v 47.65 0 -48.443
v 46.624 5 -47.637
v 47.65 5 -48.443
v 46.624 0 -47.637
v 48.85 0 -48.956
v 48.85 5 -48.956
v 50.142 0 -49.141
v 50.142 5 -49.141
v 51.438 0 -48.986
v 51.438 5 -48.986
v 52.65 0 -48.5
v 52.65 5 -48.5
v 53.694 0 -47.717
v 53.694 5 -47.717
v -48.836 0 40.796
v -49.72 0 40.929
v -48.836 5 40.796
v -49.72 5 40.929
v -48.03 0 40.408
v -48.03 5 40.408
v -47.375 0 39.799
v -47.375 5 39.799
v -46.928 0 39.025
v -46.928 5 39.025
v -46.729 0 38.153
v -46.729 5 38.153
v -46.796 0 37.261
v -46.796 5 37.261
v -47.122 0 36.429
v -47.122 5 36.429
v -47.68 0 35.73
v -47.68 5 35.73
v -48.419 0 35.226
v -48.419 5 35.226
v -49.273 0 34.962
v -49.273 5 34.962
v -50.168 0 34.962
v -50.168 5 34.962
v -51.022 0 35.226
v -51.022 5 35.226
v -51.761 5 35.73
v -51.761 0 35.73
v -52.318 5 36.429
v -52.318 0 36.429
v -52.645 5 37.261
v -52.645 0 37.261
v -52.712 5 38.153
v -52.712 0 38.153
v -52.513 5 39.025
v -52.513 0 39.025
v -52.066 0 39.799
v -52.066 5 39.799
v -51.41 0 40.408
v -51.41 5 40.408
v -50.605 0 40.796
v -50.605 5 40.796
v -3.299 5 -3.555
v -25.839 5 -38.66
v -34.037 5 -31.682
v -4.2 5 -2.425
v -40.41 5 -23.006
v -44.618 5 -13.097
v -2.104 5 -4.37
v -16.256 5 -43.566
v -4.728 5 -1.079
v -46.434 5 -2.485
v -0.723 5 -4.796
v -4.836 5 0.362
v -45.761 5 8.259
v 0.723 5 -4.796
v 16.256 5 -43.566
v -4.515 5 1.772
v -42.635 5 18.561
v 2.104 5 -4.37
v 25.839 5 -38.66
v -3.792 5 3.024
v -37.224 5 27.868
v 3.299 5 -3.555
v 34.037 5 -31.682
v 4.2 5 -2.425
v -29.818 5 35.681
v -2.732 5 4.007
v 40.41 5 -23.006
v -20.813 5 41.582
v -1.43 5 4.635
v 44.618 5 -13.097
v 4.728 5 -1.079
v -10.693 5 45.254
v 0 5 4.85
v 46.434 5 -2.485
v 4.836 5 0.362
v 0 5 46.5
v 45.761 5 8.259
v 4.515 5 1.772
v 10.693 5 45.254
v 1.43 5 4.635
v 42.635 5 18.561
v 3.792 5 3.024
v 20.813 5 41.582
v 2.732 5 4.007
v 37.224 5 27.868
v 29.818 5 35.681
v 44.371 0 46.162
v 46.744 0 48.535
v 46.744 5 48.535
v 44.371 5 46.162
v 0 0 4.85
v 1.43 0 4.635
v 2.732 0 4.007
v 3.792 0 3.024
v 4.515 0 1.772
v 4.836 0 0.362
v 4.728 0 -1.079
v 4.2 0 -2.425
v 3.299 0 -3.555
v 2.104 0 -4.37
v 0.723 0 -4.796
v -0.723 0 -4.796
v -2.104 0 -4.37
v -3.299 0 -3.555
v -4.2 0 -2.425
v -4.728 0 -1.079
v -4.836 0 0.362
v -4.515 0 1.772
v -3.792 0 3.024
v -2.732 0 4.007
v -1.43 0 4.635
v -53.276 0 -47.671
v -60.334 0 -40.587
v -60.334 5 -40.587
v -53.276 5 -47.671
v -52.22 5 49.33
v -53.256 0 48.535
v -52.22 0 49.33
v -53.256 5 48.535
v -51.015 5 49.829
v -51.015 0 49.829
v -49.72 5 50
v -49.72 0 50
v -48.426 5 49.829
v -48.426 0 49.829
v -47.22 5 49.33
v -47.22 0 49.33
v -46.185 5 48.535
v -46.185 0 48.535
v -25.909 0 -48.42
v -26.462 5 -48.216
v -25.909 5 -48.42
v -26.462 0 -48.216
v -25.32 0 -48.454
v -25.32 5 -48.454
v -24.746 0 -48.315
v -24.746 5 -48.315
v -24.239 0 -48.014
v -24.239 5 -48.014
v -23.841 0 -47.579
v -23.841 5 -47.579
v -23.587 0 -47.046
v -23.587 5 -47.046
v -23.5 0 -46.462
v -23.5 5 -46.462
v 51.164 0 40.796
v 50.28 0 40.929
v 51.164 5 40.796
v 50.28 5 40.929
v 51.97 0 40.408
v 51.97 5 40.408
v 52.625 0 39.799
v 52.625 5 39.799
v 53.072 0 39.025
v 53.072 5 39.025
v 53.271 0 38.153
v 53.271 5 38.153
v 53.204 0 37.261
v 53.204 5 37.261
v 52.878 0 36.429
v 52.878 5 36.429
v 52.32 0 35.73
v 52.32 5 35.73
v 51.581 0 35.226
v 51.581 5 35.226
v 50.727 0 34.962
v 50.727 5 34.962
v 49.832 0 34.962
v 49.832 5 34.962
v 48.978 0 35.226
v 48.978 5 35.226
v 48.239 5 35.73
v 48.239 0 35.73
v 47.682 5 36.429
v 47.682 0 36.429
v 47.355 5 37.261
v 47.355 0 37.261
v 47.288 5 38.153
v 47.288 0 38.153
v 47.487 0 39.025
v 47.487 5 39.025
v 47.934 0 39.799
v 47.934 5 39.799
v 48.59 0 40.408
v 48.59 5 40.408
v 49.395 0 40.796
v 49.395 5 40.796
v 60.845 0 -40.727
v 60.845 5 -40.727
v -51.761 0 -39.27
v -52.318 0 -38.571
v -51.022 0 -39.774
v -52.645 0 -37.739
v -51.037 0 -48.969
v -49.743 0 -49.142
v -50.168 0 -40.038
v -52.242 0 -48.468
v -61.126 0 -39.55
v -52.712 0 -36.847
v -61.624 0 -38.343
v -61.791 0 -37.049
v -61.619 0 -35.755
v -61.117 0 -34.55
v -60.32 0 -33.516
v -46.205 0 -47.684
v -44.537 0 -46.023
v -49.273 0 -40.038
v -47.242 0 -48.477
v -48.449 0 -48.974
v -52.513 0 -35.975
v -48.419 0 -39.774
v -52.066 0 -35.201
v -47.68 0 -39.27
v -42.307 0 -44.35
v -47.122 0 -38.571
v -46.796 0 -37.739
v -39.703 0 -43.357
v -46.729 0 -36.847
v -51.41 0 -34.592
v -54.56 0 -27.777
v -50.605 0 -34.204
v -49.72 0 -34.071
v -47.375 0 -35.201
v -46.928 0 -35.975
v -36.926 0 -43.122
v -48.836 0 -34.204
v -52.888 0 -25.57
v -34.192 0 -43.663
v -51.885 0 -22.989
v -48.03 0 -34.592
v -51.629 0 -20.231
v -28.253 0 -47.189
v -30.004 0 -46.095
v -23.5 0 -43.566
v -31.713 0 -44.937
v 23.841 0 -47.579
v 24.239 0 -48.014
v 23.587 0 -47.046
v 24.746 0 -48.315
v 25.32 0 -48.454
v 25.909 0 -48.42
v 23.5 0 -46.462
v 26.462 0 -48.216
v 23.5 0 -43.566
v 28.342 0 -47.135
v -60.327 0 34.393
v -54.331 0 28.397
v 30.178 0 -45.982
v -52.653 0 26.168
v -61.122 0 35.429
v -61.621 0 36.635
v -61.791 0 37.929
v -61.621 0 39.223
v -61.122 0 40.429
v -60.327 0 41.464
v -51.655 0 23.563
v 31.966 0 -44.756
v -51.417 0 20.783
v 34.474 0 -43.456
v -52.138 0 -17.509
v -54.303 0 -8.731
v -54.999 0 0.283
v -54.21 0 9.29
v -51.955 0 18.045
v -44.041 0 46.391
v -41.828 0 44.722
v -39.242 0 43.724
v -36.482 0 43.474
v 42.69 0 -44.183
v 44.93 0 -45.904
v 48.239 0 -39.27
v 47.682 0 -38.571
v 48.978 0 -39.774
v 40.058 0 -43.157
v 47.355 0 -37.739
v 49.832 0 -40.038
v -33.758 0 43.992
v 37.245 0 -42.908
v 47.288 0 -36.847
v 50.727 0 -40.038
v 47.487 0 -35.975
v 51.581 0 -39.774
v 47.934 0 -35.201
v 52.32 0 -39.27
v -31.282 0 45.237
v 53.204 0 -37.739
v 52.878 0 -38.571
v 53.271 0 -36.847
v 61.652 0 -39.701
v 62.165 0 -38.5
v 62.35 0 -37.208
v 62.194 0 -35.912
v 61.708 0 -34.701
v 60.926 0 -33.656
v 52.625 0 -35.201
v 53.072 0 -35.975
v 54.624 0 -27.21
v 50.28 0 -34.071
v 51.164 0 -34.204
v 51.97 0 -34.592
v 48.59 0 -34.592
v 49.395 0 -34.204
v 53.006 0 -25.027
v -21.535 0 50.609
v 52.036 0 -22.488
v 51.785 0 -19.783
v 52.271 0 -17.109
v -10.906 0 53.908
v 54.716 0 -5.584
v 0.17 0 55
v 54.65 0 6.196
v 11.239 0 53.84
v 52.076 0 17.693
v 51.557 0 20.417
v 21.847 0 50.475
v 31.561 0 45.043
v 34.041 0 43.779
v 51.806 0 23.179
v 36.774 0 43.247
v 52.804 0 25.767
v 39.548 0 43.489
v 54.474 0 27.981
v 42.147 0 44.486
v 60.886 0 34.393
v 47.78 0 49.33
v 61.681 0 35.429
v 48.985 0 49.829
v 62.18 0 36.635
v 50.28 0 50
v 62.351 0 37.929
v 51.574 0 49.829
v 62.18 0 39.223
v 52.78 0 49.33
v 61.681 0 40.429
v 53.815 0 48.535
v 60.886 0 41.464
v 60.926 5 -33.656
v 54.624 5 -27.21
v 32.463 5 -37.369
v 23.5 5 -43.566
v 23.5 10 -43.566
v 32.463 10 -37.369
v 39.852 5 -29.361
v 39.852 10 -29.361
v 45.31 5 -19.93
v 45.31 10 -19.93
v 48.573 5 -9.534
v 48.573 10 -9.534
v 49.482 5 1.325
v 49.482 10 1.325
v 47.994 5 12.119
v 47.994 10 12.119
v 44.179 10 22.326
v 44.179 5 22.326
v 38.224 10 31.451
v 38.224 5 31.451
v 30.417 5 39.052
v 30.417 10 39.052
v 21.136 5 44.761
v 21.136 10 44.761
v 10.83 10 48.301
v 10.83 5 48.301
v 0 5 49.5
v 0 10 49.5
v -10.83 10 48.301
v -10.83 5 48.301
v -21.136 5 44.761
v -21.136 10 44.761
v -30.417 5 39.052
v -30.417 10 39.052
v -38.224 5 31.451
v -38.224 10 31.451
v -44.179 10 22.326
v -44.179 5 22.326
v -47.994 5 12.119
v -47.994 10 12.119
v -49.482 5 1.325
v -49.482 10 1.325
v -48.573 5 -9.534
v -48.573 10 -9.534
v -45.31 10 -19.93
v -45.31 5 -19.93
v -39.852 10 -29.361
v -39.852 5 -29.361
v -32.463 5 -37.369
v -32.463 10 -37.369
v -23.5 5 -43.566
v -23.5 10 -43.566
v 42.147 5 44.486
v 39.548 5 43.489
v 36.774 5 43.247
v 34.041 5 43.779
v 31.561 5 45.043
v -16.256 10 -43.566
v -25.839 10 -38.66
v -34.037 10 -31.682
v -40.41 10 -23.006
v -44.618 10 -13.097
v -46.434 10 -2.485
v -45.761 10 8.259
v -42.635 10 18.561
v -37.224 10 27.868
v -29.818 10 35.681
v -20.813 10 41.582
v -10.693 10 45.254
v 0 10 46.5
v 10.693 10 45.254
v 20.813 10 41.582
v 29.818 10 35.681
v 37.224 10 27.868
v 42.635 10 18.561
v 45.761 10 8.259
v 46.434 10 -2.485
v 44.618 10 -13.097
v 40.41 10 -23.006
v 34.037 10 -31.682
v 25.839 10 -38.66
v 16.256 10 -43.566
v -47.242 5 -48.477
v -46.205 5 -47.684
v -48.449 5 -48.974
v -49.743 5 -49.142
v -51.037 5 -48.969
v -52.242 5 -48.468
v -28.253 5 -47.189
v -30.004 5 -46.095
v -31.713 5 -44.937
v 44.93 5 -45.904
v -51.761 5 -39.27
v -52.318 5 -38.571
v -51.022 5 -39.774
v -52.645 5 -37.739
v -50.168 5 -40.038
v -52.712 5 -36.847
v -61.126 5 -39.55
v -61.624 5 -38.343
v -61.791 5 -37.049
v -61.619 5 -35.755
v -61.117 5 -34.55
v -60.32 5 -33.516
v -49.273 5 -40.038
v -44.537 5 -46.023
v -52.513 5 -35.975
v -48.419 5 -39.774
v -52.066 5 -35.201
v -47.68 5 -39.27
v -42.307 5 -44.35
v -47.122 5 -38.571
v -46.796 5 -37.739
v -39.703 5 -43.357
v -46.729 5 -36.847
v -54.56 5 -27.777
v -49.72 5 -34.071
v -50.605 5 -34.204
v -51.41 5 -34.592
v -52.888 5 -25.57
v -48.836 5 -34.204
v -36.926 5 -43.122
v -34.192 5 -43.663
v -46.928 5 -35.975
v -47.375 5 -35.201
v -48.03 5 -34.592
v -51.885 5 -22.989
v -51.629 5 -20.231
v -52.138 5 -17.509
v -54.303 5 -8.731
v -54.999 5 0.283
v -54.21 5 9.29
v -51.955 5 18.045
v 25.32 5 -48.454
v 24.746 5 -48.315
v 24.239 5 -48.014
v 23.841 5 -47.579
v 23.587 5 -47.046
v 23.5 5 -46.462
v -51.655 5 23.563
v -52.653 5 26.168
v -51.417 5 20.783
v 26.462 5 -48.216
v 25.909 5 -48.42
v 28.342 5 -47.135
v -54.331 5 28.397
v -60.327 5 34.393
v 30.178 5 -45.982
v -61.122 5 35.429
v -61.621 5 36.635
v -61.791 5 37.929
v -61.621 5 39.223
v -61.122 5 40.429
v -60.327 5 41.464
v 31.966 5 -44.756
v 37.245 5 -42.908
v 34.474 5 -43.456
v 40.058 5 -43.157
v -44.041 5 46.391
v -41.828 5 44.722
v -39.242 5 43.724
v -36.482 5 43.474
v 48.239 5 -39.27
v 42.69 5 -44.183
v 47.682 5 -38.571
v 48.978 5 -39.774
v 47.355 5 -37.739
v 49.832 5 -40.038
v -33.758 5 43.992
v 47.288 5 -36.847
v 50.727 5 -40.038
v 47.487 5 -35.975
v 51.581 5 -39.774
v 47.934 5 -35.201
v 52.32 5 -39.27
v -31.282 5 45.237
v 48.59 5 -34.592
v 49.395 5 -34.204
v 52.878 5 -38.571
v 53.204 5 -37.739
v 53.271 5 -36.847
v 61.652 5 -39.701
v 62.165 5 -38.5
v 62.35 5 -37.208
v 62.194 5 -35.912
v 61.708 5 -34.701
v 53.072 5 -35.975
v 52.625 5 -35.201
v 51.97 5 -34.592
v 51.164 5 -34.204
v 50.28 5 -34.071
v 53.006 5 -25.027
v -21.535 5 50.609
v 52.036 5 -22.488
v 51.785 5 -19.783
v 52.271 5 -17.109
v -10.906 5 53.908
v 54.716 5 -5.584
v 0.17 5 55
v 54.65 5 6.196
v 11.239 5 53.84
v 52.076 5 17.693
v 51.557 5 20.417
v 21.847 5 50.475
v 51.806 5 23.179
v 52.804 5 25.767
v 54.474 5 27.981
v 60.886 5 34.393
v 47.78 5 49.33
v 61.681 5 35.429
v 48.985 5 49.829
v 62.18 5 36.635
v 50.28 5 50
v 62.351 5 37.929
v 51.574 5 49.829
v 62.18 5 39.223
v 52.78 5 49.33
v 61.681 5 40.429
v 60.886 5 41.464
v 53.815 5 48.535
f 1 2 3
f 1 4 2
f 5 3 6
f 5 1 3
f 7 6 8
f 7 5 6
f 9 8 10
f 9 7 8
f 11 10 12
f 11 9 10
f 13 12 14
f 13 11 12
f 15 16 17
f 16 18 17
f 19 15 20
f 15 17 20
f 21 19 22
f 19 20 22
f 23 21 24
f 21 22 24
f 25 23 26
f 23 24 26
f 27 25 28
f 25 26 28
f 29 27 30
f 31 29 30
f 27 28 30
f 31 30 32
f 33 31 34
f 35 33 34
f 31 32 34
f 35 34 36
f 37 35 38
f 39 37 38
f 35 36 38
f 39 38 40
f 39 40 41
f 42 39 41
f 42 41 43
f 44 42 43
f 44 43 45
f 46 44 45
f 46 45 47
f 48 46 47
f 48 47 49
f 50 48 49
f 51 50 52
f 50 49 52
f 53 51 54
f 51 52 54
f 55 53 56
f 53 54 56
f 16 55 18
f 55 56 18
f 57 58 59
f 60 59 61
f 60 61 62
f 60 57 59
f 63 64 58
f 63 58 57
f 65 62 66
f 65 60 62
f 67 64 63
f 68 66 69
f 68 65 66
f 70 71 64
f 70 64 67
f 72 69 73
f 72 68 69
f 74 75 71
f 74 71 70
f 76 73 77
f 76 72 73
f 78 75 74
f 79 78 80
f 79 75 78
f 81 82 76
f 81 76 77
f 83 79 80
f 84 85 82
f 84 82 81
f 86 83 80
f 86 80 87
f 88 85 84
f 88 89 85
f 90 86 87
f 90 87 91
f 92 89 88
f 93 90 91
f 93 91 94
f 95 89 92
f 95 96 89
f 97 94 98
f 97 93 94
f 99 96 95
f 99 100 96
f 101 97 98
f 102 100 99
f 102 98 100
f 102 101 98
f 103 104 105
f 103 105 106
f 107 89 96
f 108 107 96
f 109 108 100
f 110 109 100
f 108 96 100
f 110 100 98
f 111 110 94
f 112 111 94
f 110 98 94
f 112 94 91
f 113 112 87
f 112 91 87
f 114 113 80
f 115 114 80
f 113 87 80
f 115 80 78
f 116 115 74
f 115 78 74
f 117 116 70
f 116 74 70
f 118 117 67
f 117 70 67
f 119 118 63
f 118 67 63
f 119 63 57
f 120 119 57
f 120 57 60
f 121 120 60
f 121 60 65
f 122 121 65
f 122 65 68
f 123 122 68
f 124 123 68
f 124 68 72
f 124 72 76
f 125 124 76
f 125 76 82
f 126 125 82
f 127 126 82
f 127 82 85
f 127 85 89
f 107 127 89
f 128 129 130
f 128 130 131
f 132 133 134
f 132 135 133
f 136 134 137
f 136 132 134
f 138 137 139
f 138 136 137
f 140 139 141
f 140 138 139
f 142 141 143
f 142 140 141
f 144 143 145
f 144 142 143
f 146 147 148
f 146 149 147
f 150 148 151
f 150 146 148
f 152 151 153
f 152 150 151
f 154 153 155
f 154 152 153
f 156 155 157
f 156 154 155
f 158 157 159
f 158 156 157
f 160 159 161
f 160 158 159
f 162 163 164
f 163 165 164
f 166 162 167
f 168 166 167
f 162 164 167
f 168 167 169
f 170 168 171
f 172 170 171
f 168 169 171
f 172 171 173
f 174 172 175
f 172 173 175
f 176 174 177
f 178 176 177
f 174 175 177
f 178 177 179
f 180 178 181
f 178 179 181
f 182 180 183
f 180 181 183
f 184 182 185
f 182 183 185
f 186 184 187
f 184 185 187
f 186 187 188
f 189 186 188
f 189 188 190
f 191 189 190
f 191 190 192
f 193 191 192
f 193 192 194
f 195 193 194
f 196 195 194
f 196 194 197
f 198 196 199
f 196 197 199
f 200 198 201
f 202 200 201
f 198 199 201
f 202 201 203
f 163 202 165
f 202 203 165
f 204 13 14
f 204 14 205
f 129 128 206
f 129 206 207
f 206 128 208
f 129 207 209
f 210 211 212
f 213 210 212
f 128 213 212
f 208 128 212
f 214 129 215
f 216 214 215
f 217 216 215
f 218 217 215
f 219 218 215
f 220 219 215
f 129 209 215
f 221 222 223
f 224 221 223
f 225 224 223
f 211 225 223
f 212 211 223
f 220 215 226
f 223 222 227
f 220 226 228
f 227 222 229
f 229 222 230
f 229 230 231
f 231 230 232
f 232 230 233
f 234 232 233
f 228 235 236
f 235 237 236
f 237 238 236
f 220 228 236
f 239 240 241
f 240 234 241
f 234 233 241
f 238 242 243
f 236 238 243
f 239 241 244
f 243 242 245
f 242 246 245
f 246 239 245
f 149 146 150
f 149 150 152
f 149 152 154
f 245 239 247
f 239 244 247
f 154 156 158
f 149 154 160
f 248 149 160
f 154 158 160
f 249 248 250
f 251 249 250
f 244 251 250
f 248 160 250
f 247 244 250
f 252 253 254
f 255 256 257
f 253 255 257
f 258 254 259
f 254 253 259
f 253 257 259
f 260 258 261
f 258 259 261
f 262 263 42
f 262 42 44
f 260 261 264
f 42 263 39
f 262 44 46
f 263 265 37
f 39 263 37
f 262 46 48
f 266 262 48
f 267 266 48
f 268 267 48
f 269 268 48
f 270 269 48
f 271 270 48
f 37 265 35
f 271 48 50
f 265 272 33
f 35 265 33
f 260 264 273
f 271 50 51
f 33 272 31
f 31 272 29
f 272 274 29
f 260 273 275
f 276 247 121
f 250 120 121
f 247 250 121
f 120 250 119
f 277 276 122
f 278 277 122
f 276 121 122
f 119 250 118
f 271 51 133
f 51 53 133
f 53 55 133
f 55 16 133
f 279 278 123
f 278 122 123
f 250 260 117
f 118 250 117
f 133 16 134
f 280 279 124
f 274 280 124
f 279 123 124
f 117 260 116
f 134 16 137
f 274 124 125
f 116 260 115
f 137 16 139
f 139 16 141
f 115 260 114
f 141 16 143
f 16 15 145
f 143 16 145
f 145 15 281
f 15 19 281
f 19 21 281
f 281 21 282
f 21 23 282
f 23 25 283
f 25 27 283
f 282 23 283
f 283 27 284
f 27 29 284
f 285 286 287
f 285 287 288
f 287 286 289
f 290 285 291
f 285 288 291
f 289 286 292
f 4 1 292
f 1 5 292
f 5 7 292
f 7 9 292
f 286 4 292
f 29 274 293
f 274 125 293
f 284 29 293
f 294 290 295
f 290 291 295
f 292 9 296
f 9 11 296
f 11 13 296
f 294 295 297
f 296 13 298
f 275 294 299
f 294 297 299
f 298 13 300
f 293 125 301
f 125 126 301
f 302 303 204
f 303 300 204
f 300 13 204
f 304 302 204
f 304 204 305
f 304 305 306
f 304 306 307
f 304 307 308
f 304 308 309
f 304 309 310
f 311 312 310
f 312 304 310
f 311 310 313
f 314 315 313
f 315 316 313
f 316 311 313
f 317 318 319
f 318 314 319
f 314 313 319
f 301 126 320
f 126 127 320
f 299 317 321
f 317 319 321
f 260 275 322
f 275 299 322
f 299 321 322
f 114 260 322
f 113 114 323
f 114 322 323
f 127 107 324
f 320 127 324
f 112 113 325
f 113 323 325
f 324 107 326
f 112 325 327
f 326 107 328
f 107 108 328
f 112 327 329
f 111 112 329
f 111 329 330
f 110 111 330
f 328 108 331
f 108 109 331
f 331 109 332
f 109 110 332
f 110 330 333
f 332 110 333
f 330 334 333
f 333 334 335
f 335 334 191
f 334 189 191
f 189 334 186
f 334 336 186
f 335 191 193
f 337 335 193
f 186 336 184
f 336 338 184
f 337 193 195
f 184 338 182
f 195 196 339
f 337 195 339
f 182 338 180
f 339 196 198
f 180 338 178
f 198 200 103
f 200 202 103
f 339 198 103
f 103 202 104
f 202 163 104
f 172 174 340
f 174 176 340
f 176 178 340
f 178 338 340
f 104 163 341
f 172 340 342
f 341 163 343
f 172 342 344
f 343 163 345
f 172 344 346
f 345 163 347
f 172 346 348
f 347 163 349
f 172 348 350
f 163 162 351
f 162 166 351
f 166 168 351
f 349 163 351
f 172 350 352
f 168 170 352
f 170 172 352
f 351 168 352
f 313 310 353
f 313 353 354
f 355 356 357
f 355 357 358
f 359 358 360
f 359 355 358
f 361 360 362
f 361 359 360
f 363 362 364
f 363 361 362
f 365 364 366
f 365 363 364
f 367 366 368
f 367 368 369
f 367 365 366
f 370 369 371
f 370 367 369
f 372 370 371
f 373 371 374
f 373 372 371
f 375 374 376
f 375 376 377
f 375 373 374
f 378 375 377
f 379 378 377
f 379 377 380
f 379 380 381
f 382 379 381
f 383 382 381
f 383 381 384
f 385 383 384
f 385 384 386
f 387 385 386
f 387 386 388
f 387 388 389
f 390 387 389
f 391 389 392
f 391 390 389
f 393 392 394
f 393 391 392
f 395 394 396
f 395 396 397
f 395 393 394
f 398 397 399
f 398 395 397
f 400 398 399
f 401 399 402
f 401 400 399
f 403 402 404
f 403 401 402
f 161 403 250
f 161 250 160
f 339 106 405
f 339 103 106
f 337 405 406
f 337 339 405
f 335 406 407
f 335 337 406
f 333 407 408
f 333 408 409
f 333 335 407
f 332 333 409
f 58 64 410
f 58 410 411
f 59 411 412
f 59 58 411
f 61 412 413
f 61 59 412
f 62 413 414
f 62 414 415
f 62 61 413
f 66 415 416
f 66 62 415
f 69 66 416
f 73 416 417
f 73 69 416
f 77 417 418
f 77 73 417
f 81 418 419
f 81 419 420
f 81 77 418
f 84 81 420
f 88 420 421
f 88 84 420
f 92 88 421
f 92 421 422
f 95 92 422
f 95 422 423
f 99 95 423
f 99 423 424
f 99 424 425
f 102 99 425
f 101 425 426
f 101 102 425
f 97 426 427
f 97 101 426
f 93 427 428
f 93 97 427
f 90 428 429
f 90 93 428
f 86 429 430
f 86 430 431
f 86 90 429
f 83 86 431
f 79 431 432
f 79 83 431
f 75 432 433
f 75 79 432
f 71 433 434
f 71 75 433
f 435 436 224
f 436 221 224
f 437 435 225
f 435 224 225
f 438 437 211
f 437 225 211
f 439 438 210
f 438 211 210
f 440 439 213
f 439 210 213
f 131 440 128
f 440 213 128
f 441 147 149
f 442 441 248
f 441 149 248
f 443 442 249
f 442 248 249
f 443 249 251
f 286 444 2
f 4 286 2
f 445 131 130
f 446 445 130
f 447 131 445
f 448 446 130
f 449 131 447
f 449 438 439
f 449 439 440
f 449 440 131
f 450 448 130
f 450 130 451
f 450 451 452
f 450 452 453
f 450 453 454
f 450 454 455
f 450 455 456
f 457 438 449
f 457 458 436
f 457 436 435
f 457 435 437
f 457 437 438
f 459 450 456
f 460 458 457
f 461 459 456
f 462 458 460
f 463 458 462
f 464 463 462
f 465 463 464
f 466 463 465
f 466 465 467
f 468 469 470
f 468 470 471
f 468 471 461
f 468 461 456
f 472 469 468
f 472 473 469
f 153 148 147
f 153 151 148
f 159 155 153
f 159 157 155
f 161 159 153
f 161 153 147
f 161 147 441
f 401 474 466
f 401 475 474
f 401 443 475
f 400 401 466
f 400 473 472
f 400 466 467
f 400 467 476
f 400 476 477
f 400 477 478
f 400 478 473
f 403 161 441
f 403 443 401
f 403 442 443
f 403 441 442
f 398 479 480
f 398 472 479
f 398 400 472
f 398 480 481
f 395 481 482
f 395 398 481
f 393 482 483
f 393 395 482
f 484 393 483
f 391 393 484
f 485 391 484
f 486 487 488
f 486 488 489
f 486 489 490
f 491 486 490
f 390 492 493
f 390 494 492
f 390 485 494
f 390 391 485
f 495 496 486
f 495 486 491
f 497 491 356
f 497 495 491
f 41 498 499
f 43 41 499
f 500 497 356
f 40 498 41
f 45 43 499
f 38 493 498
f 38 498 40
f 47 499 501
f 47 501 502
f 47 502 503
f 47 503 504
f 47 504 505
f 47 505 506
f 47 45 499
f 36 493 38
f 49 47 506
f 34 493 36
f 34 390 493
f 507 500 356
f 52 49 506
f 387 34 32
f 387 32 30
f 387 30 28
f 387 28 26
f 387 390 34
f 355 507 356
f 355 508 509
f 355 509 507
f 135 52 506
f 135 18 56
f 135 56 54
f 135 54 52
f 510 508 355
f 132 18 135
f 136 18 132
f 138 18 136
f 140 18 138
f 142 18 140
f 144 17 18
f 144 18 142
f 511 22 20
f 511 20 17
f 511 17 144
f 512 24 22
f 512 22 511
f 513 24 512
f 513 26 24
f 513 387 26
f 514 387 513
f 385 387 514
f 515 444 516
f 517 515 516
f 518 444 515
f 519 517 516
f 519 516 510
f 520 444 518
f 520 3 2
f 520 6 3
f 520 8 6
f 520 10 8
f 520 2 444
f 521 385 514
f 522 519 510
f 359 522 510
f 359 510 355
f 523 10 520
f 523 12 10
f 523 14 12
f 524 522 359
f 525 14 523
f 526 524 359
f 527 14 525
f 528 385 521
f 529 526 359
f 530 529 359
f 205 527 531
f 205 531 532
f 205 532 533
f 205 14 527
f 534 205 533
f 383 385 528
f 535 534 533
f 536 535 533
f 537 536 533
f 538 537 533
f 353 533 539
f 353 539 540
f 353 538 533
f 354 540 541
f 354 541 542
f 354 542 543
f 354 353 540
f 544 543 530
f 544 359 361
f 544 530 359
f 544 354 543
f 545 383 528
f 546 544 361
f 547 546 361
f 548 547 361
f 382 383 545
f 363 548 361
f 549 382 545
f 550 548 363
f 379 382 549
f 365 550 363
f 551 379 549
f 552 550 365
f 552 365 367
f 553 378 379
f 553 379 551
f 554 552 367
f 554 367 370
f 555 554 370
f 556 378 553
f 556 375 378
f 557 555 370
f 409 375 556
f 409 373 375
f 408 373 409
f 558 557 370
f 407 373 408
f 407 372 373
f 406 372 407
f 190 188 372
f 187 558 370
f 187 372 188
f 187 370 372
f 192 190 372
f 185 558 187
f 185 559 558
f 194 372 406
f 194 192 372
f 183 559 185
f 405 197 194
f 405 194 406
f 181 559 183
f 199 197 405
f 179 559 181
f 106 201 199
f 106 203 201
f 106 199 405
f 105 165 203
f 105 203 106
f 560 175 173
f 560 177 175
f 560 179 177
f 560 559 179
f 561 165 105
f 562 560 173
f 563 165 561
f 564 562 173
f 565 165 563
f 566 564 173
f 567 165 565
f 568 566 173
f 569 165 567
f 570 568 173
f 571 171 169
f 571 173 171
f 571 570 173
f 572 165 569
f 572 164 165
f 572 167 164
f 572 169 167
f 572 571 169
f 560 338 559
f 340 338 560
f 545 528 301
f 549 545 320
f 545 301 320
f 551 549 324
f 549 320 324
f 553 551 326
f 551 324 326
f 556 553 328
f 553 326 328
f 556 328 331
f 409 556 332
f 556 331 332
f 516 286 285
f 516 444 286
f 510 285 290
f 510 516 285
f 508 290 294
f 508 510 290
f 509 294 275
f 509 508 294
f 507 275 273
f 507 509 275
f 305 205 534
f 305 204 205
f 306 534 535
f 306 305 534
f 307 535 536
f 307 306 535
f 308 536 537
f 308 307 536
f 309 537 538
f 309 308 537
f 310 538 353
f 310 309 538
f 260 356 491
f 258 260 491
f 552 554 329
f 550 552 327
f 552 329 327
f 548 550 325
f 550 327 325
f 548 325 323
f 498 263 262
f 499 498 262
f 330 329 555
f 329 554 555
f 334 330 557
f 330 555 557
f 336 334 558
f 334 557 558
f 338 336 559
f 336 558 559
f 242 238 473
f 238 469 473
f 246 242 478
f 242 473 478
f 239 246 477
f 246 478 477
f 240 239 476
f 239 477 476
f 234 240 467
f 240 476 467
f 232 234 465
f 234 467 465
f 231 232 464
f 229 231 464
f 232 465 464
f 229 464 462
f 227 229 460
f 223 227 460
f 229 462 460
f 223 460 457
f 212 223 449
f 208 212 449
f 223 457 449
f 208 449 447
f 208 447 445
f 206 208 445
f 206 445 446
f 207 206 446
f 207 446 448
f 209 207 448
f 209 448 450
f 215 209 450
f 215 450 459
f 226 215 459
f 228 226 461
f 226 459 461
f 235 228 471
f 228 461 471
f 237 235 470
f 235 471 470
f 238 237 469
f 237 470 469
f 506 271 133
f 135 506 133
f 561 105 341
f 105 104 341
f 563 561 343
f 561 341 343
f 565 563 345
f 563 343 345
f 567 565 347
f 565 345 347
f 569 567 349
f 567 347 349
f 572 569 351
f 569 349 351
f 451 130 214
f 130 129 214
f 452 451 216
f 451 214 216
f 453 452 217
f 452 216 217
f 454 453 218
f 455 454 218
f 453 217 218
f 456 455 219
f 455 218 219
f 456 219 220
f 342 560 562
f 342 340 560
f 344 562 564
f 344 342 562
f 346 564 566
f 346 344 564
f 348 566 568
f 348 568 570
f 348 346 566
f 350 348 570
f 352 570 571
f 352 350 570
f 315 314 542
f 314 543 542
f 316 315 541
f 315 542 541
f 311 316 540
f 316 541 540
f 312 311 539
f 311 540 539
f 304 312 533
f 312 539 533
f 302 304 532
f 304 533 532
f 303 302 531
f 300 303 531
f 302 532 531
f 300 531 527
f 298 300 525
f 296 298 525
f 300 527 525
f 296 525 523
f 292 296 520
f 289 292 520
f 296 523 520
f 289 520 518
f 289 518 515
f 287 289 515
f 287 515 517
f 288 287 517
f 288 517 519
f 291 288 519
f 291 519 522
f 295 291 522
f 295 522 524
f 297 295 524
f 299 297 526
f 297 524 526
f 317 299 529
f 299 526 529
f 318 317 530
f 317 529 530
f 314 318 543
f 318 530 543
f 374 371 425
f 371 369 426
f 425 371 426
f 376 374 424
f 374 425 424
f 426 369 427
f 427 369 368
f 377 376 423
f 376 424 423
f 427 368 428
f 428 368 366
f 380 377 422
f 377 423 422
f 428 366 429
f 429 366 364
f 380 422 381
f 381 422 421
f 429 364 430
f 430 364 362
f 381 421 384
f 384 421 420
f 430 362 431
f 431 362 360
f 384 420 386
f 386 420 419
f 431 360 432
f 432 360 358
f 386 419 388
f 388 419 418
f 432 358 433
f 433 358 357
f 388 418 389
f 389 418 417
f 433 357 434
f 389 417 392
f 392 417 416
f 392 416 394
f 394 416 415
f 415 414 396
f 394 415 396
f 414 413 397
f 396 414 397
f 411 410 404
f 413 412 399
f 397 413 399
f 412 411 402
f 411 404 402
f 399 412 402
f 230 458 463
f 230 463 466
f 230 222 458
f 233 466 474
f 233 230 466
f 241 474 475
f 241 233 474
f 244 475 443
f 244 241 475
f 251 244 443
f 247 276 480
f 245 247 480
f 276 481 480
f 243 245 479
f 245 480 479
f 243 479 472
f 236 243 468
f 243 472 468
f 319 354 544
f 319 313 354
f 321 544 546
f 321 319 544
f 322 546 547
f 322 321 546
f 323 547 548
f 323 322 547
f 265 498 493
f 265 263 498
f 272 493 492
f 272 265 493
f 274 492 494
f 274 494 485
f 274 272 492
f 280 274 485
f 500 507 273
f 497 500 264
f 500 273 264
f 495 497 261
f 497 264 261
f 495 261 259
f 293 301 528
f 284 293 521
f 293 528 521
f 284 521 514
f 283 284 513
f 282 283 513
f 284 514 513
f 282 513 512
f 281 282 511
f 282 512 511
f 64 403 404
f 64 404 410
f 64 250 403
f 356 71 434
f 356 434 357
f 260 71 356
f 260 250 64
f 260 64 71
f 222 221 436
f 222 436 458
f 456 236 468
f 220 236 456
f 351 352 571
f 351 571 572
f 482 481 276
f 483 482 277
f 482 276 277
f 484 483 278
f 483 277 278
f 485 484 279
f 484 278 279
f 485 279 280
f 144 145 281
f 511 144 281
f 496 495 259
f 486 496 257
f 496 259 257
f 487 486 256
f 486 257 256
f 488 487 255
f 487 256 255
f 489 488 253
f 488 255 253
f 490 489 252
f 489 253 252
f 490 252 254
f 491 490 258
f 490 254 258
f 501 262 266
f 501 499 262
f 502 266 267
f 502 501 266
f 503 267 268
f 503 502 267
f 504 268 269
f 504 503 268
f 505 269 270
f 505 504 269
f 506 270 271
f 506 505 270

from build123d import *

# Parameters (mm, degrees)
SKETCH_1_R                  = 55
EXTRUDE_1_DEPTH             = 5
SKETCH_5_W                  = 47
SKETCH_5_H                  = 12.24289715
CUT_EXTRUDE_2_DEPTH         = 30
FILLET_4_R                  = 2
FILLET_5_R                  = 2
EXTRUDE_3_REACH             = 79.84
EXTRUDE_3_DIRECTION_2_REACH = 79.84
FILLET_7_R                  = 10
FILLET_8_R                  = 5
SKETCH_10_R                 = 3
CUT_EXTRUDE_5_DEPTH         = 5
SKETCH_15_R                 = 4.85
CUT_EXTRUDE_6_DEPTH         = 10
EXTRUDE_4_DEPTH             = 5


with BuildPart() as part:
    # 草图1 → 凸台-拉伸1 (new body)
    with BuildSketch(Plane(origin=(0, 0, 0), x_dir=(1, 0, 0), z_dir=(0, 1, 0))):
        with Locations(Location((0, 0, 0), (0, 0, 270))):
            Circle(SKETCH_1_R)
    extrude(amount=EXTRUDE_1_DEPTH)

    # 草图5 → 切除-拉伸2 (cut)
    with BuildSketch(Plane(origin=(0, 5, 0), x_dir=(1, 0, 0), z_dir=(0, 1, 0))):
        with Locations((0, 49.687490397)):
            Rectangle(SKETCH_5_W, SKETCH_5_H)
    extrude(amount=-CUT_EXTRUDE_2_DEPTH, mode=Mode.SUBTRACT)

    # 圆角4
    fillet_4_edges = [part.edges().sort_by_distance(p)[0] for p in [
        (-23.5, 2.5, -49.726753363),
    ]]
    fillet(fillet_4_edges, radius=FILLET_4_R)

    # 圆角5
    fillet_5_edges = [part.edges().sort_by_distance(p)[0] for p in [
        (23.5, 2.5, -49.726753363),
    ]]
    fillet(fillet_5_edges, radius=FILLET_5_R)

    # 凸台-拉伸3: up to this face of the body (flat: up to its plane)
    extrude_3_end = Plane(part.part.faces().sort_by_distance((0, 0, 2.477505486))[0])
    # 草图14 → 凸台-拉伸3 (add, up to the picked face)
    with BuildSketch(Plane(origin=(0, 3, 0), x_dir=(1, 0, 0), z_dir=(0, 1, 0)), mode=Mode.PRIVATE) as extrude_3_sk1:
        with BuildLine():
            Line((-49.898576095, 23.132922507), (-63.862525635, 37.044772973))
            Line((-63.862525635, 37.044772973), (-49.746845912, 51.213315099))
            Line((-49.746845912, 51.213315099), (-38.128637352, 39.638453724))
            ThreePointArc((-38.128637352, 39.638453724), (-44.78063998, 31.932652301), (-49.898576095, 23.132922507))
        make_face()
    extrude_3_tool1 = split(extrude(extrude_3_sk1.sketch, amount=-EXTRUDE_3_REACH, mode=Mode.PRIVATE), bisect_by=extrude_3_end, keep=Keep.BOTH, mode=Mode.PRIVATE)
    # 草图14 → 凸台-拉伸3 (add, up to the picked face)
    with BuildSketch(Plane(origin=(0, 3, 0), x_dir=(1, 0, 0), z_dir=(0, 1, 0)), mode=Mode.PRIVATE) as extrude_3_sk2:
        with BuildLine():
            Line((49.811900188, -23.3189751), (64.421720913, -37.928795825))
            Line((64.421720913, -37.928795825), (50.279585289, -52.070931449))
            Line((50.279585289, -52.070931449), (37.984884655, -39.776230814))
            ThreePointArc((37.984884655, -39.776230814), (44.662950793, -32.097053236), (49.811900188, -23.3189751))
        make_face()
    extrude_3_tool2 = split(extrude(extrude_3_sk2.sketch, amount=-EXTRUDE_3_REACH, mode=Mode.PRIVATE), bisect_by=extrude_3_end, keep=Keep.BOTH, mode=Mode.PRIVATE)
    # 草图14 → 凸台-拉伸3 (add, up to the picked face)
    with BuildSketch(Plane(origin=(0, 3, 0), x_dir=(1, 0, 0), z_dir=(0, 1, 0)), mode=Mode.PRIVATE) as extrude_3_sk3:
        with BuildLine():
            Line((-49.632393674, -23.698639164), (-63.862550335, -37.928795825))
            Line((-63.862550335, -37.928795825), (-49.720414711, -52.070931449))
            Line((-49.720414711, -52.070931449), (-37.697852746, -40.048369484))
            ThreePointArc((-37.697852746, -40.048369484), (-44.423770724, -32.427281642), (-49.632393674, -23.698639164))
        make_face()
    extrude_3_tool3 = split(extrude(extrude_3_sk3.sketch, amount=-EXTRUDE_3_REACH, mode=Mode.PRIVATE), bisect_by=extrude_3_end, keep=Keep.BOTH, mode=Mode.PRIVATE)
    # 草图14 → 凸台-拉伸3 (add, up to the picked face)
    with BuildSketch(Plane(origin=(0, 3, 0), x_dir=(1, 0, 0), z_dir=(0, 1, 0)), mode=Mode.PRIVATE) as extrude_3_sk4:
        with BuildLine():
            Line((38.475737251, 39.301623923), (50.118901666, 51.212426922))
            Line((50.118901666, 51.212426922), (64.420808036, 37.231887798))
            Line((64.420808036, 37.231887798), (50.134465219, 22.6171483))
            ThreePointArc((50.134465219, 22.6171483), (45.083643676, 31.50341367), (38.475737251, 39.301623923))
        make_face()
    extrude_3_tool4 = split(extrude(extrude_3_sk4.sketch, amount=-EXTRUDE_3_REACH, mode=Mode.PRIVATE), bisect_by=extrude_3_end, keep=Keep.BOTH, mode=Mode.PRIVATE)
    add(extrude_3_tool1.solids().sort_by(Axis((-50.837096, 3, -37.73966), (0, -1, 0)))[0])
    add(extrude_3_tool2.solids().sort_by(Axis((51.039653, 3, 38.272151), (0, -1, 0)))[0])
    add(extrude_3_tool3.solids().sort_by(Axis((-50.639154, 3, 38.439997), (0, -1, 0)))[0])
    add(extrude_3_tool4.solids().sort_by(Axis((51.238479, 3, -37.552164), (0, -1, 0)))[0])

    # 凸台-拉伸3 direction 2: up to this face of the body (flat: up to its plane)
    extrude_3_direction_2_end = Plane(part.part.faces().sort_by_distance((0, 5, 2.477505486))[0])
    # 草图14 → 凸台-拉伸3 direction 2 (add, up to the picked face)
    with BuildSketch(Plane(origin=(0, 3, 0), x_dir=(1, 0, 0), z_dir=(0, 1, 0)), mode=Mode.PRIVATE) as extrude_3_direction_2_sk1:
        with BuildLine():
            Line((-49.898576095, 23.132922507), (-63.862525635, 37.044772973))
            Line((-63.862525635, 37.044772973), (-49.746845912, 51.213315099))
            Line((-49.746845912, 51.213315099), (-38.128637352, 39.638453724))
            ThreePointArc((-38.128637352, 39.638453724), (-44.78063998, 31.932652301), (-49.898576095, 23.132922507))
        make_face()
    extrude_3_direction_2_tool1 = split(extrude(extrude_3_direction_2_sk1.sketch, amount=EXTRUDE_3_DIRECTION_2_REACH, mode=Mode.PRIVATE), bisect_by=extrude_3_direction_2_end, keep=Keep.BOTH, mode=Mode.PRIVATE)
    # 草图14 → 凸台-拉伸3 direction 2 (add, up to the picked face)
    with BuildSketch(Plane(origin=(0, 3, 0), x_dir=(1, 0, 0), z_dir=(0, 1, 0)), mode=Mode.PRIVATE) as extrude_3_direction_2_sk2:
        with BuildLine():
            Line((49.811900188, -23.3189751), (64.421720913, -37.928795825))
            Line((64.421720913, -37.928795825), (50.279585289, -52.070931449))
            Line((50.279585289, -52.070931449), (37.984884655, -39.776230814))
            ThreePointArc((37.984884655, -39.776230814), (44.662950793, -32.097053236), (49.811900188, -23.3189751))
        make_face()
    extrude_3_direction_2_tool2 = split(extrude(extrude_3_direction_2_sk2.sketch, amount=EXTRUDE_3_DIRECTION_2_REACH, mode=Mode.PRIVATE), bisect_by=extrude_3_direction_2_end, keep=Keep.BOTH, mode=Mode.PRIVATE)
    # 草图14 → 凸台-拉伸3 direction 2 (add, up to the picked face)
    with BuildSketch(Plane(origin=(0, 3, 0), x_dir=(1, 0, 0), z_dir=(0, 1, 0)), mode=Mode.PRIVATE) as extrude_3_direction_2_sk3:
        with BuildLine():
            Line((-49.632393674, -23.698639164), (-63.862550335, -37.928795825))
            Line((-63.862550335, -37.928795825), (-49.720414711, -52.070931449))
            Line((-49.720414711, -52.070931449), (-37.697852746, -40.048369484))
            ThreePointArc((-37.697852746, -40.048369484), (-44.423770724, -32.427281642), (-49.632393674, -23.698639164))
        make_face()
    extrude_3_direction_2_tool3 = split(extrude(extrude_3_direction_2_sk3.sketch, amount=EXTRUDE_3_DIRECTION_2_REACH, mode=Mode.PRIVATE), bisect_by=extrude_3_direction_2_end, keep=Keep.BOTH, mode=Mode.PRIVATE)
    # 草图14 → 凸台-拉伸3 direction 2 (add, up to the picked face)
    with BuildSketch(Plane(origin=(0, 3, 0), x_dir=(1, 0, 0), z_dir=(0, 1, 0)), mode=Mode.PRIVATE) as extrude_3_direction_2_sk4:
        with BuildLine():
            Line((38.475737251, 39.301623923), (50.118901666, 51.212426922))
            Line((50.118901666, 51.212426922), (64.420808036, 37.231887798))
            Line((64.420808036, 37.231887798), (50.134465219, 22.6171483))
            ThreePointArc((50.134465219, 22.6171483), (45.083643676, 31.50341367), (38.475737251, 39.301623923))
        make_face()
    extrude_3_direction_2_tool4 = split(extrude(extrude_3_direction_2_sk4.sketch, amount=EXTRUDE_3_DIRECTION_2_REACH, mode=Mode.PRIVATE), bisect_by=extrude_3_direction_2_end, keep=Keep.BOTH, mode=Mode.PRIVATE)
    add(extrude_3_direction_2_tool1.solids().sort_by(Axis((-50.837096, 3, -37.73966), (0, 1, 0)))[0])
    add(extrude_3_direction_2_tool2.solids().sort_by(Axis((51.039653, 3, 38.272151), (0, 1, 0)))[0])
    add(extrude_3_direction_2_tool3.solids().sort_by(Axis((-50.639154, 3, 38.439997), (0, 1, 0)))[0])
    add(extrude_3_direction_2_tool4.solids().sort_by(Axis((51.238479, 3, -37.552164), (0, 1, 0)))[0])

    # 圆角7
    fillet_7_edges = [part.edges().sort_by_distance(p)[0] for p in [
        (-38.128637352, 2.5, -39.638453724),
        (-49.898576095, 2.5, -23.132922507),
        (-49.632393674, 2.5, 23.698639164),
        (-37.697852746, 2.5, 40.048369484),
        (50.134465219, 2.5, -22.6171483),
        (38.475737251, 2.5, -39.301623923),
        (37.984884655, 2.5, 39.776230814),
        (49.811900188, 2.5, 23.3189751),
    ]]
    fillet(fillet_7_edges, radius=FILLET_7_R)

    # 圆角8
    fillet_8_edges = [part.edges().sort_by_distance(p)[0] for p in [
        (-63.862525635, 2.5, -37.044772973),
        (-49.746845912, 2.5, -51.213315099),
        (-49.720414711, 2.5, 52.070931449),
        (-63.862550335, 2.5, 37.928795825),
        (50.118901666, 2.5, -51.212426922),
        (64.420808036, 2.5, -37.231887798),
        (50.279585289, 2.5, 52.070931449),
        (64.421720913, 2.5, 37.928795825),
    ]]
    fillet(fillet_8_edges, radius=FILLET_8_R)

    # 草图10 → 切除-拉伸5 (cut, symmetric)
    with BuildSketch(Plane(origin=(0, 3, 0), x_dir=(1, 0, 0), z_dir=(0, 1, 0))):
        with Locations(Location((-49.720414711, 37.071204175, 0), (0, 0, 270))):
            Circle(SKETCH_10_R)
        with Locations(Location((50.279585289, 37.071204175, 0), (0, 0, 270))):
            Circle(SKETCH_10_R)
        with Locations(Location((-49.720414711, -37.928795825, 0), (0, 0, 270))):
            Circle(SKETCH_10_R)
        with Locations(Location((50.279585289, -37.928795825, 0), (0, 0, 270))):
            Circle(SKETCH_10_R)
    extrude(amount=CUT_EXTRUDE_5_DEPTH, both=True, mode=Mode.SUBTRACT)

    # 草图15 → 切除-拉伸6 (cut)
    with BuildSketch(Plane(origin=(0, 5, 0), x_dir=(1, 0, 0), z_dir=(0, 1, 0))):
        with Locations(Location((0, 0, 0), (0, 0, 270))):
            Circle(SKETCH_15_R)
    extrude(amount=-CUT_EXTRUDE_6_DEPTH, mode=Mode.SUBTRACT)

    # 草图17 → 凸台-拉伸4 (add)
    with BuildSketch(Plane(origin=(0, 5, 0), x_dir=(1, 0, 0), z_dir=(0, 1, 0))):
        with BuildLine():
            Line((-23.5, 43.566041822), (-16.255768207, 43.566041822))
            ThreePointArc((-16.255768207, 43.566041822), (0, -46.5), (16.255768207, 43.566041822))
            Line((16.255768207, 43.566041822), (23.5, 43.566041822))
            ThreePointArc((23.5, 43.566041822), (0, -49.5), (-23.5, 43.566041822))
        make_face()
    extrude(amount=EXTRUDE_4_DEPTH)


solid = part.part
